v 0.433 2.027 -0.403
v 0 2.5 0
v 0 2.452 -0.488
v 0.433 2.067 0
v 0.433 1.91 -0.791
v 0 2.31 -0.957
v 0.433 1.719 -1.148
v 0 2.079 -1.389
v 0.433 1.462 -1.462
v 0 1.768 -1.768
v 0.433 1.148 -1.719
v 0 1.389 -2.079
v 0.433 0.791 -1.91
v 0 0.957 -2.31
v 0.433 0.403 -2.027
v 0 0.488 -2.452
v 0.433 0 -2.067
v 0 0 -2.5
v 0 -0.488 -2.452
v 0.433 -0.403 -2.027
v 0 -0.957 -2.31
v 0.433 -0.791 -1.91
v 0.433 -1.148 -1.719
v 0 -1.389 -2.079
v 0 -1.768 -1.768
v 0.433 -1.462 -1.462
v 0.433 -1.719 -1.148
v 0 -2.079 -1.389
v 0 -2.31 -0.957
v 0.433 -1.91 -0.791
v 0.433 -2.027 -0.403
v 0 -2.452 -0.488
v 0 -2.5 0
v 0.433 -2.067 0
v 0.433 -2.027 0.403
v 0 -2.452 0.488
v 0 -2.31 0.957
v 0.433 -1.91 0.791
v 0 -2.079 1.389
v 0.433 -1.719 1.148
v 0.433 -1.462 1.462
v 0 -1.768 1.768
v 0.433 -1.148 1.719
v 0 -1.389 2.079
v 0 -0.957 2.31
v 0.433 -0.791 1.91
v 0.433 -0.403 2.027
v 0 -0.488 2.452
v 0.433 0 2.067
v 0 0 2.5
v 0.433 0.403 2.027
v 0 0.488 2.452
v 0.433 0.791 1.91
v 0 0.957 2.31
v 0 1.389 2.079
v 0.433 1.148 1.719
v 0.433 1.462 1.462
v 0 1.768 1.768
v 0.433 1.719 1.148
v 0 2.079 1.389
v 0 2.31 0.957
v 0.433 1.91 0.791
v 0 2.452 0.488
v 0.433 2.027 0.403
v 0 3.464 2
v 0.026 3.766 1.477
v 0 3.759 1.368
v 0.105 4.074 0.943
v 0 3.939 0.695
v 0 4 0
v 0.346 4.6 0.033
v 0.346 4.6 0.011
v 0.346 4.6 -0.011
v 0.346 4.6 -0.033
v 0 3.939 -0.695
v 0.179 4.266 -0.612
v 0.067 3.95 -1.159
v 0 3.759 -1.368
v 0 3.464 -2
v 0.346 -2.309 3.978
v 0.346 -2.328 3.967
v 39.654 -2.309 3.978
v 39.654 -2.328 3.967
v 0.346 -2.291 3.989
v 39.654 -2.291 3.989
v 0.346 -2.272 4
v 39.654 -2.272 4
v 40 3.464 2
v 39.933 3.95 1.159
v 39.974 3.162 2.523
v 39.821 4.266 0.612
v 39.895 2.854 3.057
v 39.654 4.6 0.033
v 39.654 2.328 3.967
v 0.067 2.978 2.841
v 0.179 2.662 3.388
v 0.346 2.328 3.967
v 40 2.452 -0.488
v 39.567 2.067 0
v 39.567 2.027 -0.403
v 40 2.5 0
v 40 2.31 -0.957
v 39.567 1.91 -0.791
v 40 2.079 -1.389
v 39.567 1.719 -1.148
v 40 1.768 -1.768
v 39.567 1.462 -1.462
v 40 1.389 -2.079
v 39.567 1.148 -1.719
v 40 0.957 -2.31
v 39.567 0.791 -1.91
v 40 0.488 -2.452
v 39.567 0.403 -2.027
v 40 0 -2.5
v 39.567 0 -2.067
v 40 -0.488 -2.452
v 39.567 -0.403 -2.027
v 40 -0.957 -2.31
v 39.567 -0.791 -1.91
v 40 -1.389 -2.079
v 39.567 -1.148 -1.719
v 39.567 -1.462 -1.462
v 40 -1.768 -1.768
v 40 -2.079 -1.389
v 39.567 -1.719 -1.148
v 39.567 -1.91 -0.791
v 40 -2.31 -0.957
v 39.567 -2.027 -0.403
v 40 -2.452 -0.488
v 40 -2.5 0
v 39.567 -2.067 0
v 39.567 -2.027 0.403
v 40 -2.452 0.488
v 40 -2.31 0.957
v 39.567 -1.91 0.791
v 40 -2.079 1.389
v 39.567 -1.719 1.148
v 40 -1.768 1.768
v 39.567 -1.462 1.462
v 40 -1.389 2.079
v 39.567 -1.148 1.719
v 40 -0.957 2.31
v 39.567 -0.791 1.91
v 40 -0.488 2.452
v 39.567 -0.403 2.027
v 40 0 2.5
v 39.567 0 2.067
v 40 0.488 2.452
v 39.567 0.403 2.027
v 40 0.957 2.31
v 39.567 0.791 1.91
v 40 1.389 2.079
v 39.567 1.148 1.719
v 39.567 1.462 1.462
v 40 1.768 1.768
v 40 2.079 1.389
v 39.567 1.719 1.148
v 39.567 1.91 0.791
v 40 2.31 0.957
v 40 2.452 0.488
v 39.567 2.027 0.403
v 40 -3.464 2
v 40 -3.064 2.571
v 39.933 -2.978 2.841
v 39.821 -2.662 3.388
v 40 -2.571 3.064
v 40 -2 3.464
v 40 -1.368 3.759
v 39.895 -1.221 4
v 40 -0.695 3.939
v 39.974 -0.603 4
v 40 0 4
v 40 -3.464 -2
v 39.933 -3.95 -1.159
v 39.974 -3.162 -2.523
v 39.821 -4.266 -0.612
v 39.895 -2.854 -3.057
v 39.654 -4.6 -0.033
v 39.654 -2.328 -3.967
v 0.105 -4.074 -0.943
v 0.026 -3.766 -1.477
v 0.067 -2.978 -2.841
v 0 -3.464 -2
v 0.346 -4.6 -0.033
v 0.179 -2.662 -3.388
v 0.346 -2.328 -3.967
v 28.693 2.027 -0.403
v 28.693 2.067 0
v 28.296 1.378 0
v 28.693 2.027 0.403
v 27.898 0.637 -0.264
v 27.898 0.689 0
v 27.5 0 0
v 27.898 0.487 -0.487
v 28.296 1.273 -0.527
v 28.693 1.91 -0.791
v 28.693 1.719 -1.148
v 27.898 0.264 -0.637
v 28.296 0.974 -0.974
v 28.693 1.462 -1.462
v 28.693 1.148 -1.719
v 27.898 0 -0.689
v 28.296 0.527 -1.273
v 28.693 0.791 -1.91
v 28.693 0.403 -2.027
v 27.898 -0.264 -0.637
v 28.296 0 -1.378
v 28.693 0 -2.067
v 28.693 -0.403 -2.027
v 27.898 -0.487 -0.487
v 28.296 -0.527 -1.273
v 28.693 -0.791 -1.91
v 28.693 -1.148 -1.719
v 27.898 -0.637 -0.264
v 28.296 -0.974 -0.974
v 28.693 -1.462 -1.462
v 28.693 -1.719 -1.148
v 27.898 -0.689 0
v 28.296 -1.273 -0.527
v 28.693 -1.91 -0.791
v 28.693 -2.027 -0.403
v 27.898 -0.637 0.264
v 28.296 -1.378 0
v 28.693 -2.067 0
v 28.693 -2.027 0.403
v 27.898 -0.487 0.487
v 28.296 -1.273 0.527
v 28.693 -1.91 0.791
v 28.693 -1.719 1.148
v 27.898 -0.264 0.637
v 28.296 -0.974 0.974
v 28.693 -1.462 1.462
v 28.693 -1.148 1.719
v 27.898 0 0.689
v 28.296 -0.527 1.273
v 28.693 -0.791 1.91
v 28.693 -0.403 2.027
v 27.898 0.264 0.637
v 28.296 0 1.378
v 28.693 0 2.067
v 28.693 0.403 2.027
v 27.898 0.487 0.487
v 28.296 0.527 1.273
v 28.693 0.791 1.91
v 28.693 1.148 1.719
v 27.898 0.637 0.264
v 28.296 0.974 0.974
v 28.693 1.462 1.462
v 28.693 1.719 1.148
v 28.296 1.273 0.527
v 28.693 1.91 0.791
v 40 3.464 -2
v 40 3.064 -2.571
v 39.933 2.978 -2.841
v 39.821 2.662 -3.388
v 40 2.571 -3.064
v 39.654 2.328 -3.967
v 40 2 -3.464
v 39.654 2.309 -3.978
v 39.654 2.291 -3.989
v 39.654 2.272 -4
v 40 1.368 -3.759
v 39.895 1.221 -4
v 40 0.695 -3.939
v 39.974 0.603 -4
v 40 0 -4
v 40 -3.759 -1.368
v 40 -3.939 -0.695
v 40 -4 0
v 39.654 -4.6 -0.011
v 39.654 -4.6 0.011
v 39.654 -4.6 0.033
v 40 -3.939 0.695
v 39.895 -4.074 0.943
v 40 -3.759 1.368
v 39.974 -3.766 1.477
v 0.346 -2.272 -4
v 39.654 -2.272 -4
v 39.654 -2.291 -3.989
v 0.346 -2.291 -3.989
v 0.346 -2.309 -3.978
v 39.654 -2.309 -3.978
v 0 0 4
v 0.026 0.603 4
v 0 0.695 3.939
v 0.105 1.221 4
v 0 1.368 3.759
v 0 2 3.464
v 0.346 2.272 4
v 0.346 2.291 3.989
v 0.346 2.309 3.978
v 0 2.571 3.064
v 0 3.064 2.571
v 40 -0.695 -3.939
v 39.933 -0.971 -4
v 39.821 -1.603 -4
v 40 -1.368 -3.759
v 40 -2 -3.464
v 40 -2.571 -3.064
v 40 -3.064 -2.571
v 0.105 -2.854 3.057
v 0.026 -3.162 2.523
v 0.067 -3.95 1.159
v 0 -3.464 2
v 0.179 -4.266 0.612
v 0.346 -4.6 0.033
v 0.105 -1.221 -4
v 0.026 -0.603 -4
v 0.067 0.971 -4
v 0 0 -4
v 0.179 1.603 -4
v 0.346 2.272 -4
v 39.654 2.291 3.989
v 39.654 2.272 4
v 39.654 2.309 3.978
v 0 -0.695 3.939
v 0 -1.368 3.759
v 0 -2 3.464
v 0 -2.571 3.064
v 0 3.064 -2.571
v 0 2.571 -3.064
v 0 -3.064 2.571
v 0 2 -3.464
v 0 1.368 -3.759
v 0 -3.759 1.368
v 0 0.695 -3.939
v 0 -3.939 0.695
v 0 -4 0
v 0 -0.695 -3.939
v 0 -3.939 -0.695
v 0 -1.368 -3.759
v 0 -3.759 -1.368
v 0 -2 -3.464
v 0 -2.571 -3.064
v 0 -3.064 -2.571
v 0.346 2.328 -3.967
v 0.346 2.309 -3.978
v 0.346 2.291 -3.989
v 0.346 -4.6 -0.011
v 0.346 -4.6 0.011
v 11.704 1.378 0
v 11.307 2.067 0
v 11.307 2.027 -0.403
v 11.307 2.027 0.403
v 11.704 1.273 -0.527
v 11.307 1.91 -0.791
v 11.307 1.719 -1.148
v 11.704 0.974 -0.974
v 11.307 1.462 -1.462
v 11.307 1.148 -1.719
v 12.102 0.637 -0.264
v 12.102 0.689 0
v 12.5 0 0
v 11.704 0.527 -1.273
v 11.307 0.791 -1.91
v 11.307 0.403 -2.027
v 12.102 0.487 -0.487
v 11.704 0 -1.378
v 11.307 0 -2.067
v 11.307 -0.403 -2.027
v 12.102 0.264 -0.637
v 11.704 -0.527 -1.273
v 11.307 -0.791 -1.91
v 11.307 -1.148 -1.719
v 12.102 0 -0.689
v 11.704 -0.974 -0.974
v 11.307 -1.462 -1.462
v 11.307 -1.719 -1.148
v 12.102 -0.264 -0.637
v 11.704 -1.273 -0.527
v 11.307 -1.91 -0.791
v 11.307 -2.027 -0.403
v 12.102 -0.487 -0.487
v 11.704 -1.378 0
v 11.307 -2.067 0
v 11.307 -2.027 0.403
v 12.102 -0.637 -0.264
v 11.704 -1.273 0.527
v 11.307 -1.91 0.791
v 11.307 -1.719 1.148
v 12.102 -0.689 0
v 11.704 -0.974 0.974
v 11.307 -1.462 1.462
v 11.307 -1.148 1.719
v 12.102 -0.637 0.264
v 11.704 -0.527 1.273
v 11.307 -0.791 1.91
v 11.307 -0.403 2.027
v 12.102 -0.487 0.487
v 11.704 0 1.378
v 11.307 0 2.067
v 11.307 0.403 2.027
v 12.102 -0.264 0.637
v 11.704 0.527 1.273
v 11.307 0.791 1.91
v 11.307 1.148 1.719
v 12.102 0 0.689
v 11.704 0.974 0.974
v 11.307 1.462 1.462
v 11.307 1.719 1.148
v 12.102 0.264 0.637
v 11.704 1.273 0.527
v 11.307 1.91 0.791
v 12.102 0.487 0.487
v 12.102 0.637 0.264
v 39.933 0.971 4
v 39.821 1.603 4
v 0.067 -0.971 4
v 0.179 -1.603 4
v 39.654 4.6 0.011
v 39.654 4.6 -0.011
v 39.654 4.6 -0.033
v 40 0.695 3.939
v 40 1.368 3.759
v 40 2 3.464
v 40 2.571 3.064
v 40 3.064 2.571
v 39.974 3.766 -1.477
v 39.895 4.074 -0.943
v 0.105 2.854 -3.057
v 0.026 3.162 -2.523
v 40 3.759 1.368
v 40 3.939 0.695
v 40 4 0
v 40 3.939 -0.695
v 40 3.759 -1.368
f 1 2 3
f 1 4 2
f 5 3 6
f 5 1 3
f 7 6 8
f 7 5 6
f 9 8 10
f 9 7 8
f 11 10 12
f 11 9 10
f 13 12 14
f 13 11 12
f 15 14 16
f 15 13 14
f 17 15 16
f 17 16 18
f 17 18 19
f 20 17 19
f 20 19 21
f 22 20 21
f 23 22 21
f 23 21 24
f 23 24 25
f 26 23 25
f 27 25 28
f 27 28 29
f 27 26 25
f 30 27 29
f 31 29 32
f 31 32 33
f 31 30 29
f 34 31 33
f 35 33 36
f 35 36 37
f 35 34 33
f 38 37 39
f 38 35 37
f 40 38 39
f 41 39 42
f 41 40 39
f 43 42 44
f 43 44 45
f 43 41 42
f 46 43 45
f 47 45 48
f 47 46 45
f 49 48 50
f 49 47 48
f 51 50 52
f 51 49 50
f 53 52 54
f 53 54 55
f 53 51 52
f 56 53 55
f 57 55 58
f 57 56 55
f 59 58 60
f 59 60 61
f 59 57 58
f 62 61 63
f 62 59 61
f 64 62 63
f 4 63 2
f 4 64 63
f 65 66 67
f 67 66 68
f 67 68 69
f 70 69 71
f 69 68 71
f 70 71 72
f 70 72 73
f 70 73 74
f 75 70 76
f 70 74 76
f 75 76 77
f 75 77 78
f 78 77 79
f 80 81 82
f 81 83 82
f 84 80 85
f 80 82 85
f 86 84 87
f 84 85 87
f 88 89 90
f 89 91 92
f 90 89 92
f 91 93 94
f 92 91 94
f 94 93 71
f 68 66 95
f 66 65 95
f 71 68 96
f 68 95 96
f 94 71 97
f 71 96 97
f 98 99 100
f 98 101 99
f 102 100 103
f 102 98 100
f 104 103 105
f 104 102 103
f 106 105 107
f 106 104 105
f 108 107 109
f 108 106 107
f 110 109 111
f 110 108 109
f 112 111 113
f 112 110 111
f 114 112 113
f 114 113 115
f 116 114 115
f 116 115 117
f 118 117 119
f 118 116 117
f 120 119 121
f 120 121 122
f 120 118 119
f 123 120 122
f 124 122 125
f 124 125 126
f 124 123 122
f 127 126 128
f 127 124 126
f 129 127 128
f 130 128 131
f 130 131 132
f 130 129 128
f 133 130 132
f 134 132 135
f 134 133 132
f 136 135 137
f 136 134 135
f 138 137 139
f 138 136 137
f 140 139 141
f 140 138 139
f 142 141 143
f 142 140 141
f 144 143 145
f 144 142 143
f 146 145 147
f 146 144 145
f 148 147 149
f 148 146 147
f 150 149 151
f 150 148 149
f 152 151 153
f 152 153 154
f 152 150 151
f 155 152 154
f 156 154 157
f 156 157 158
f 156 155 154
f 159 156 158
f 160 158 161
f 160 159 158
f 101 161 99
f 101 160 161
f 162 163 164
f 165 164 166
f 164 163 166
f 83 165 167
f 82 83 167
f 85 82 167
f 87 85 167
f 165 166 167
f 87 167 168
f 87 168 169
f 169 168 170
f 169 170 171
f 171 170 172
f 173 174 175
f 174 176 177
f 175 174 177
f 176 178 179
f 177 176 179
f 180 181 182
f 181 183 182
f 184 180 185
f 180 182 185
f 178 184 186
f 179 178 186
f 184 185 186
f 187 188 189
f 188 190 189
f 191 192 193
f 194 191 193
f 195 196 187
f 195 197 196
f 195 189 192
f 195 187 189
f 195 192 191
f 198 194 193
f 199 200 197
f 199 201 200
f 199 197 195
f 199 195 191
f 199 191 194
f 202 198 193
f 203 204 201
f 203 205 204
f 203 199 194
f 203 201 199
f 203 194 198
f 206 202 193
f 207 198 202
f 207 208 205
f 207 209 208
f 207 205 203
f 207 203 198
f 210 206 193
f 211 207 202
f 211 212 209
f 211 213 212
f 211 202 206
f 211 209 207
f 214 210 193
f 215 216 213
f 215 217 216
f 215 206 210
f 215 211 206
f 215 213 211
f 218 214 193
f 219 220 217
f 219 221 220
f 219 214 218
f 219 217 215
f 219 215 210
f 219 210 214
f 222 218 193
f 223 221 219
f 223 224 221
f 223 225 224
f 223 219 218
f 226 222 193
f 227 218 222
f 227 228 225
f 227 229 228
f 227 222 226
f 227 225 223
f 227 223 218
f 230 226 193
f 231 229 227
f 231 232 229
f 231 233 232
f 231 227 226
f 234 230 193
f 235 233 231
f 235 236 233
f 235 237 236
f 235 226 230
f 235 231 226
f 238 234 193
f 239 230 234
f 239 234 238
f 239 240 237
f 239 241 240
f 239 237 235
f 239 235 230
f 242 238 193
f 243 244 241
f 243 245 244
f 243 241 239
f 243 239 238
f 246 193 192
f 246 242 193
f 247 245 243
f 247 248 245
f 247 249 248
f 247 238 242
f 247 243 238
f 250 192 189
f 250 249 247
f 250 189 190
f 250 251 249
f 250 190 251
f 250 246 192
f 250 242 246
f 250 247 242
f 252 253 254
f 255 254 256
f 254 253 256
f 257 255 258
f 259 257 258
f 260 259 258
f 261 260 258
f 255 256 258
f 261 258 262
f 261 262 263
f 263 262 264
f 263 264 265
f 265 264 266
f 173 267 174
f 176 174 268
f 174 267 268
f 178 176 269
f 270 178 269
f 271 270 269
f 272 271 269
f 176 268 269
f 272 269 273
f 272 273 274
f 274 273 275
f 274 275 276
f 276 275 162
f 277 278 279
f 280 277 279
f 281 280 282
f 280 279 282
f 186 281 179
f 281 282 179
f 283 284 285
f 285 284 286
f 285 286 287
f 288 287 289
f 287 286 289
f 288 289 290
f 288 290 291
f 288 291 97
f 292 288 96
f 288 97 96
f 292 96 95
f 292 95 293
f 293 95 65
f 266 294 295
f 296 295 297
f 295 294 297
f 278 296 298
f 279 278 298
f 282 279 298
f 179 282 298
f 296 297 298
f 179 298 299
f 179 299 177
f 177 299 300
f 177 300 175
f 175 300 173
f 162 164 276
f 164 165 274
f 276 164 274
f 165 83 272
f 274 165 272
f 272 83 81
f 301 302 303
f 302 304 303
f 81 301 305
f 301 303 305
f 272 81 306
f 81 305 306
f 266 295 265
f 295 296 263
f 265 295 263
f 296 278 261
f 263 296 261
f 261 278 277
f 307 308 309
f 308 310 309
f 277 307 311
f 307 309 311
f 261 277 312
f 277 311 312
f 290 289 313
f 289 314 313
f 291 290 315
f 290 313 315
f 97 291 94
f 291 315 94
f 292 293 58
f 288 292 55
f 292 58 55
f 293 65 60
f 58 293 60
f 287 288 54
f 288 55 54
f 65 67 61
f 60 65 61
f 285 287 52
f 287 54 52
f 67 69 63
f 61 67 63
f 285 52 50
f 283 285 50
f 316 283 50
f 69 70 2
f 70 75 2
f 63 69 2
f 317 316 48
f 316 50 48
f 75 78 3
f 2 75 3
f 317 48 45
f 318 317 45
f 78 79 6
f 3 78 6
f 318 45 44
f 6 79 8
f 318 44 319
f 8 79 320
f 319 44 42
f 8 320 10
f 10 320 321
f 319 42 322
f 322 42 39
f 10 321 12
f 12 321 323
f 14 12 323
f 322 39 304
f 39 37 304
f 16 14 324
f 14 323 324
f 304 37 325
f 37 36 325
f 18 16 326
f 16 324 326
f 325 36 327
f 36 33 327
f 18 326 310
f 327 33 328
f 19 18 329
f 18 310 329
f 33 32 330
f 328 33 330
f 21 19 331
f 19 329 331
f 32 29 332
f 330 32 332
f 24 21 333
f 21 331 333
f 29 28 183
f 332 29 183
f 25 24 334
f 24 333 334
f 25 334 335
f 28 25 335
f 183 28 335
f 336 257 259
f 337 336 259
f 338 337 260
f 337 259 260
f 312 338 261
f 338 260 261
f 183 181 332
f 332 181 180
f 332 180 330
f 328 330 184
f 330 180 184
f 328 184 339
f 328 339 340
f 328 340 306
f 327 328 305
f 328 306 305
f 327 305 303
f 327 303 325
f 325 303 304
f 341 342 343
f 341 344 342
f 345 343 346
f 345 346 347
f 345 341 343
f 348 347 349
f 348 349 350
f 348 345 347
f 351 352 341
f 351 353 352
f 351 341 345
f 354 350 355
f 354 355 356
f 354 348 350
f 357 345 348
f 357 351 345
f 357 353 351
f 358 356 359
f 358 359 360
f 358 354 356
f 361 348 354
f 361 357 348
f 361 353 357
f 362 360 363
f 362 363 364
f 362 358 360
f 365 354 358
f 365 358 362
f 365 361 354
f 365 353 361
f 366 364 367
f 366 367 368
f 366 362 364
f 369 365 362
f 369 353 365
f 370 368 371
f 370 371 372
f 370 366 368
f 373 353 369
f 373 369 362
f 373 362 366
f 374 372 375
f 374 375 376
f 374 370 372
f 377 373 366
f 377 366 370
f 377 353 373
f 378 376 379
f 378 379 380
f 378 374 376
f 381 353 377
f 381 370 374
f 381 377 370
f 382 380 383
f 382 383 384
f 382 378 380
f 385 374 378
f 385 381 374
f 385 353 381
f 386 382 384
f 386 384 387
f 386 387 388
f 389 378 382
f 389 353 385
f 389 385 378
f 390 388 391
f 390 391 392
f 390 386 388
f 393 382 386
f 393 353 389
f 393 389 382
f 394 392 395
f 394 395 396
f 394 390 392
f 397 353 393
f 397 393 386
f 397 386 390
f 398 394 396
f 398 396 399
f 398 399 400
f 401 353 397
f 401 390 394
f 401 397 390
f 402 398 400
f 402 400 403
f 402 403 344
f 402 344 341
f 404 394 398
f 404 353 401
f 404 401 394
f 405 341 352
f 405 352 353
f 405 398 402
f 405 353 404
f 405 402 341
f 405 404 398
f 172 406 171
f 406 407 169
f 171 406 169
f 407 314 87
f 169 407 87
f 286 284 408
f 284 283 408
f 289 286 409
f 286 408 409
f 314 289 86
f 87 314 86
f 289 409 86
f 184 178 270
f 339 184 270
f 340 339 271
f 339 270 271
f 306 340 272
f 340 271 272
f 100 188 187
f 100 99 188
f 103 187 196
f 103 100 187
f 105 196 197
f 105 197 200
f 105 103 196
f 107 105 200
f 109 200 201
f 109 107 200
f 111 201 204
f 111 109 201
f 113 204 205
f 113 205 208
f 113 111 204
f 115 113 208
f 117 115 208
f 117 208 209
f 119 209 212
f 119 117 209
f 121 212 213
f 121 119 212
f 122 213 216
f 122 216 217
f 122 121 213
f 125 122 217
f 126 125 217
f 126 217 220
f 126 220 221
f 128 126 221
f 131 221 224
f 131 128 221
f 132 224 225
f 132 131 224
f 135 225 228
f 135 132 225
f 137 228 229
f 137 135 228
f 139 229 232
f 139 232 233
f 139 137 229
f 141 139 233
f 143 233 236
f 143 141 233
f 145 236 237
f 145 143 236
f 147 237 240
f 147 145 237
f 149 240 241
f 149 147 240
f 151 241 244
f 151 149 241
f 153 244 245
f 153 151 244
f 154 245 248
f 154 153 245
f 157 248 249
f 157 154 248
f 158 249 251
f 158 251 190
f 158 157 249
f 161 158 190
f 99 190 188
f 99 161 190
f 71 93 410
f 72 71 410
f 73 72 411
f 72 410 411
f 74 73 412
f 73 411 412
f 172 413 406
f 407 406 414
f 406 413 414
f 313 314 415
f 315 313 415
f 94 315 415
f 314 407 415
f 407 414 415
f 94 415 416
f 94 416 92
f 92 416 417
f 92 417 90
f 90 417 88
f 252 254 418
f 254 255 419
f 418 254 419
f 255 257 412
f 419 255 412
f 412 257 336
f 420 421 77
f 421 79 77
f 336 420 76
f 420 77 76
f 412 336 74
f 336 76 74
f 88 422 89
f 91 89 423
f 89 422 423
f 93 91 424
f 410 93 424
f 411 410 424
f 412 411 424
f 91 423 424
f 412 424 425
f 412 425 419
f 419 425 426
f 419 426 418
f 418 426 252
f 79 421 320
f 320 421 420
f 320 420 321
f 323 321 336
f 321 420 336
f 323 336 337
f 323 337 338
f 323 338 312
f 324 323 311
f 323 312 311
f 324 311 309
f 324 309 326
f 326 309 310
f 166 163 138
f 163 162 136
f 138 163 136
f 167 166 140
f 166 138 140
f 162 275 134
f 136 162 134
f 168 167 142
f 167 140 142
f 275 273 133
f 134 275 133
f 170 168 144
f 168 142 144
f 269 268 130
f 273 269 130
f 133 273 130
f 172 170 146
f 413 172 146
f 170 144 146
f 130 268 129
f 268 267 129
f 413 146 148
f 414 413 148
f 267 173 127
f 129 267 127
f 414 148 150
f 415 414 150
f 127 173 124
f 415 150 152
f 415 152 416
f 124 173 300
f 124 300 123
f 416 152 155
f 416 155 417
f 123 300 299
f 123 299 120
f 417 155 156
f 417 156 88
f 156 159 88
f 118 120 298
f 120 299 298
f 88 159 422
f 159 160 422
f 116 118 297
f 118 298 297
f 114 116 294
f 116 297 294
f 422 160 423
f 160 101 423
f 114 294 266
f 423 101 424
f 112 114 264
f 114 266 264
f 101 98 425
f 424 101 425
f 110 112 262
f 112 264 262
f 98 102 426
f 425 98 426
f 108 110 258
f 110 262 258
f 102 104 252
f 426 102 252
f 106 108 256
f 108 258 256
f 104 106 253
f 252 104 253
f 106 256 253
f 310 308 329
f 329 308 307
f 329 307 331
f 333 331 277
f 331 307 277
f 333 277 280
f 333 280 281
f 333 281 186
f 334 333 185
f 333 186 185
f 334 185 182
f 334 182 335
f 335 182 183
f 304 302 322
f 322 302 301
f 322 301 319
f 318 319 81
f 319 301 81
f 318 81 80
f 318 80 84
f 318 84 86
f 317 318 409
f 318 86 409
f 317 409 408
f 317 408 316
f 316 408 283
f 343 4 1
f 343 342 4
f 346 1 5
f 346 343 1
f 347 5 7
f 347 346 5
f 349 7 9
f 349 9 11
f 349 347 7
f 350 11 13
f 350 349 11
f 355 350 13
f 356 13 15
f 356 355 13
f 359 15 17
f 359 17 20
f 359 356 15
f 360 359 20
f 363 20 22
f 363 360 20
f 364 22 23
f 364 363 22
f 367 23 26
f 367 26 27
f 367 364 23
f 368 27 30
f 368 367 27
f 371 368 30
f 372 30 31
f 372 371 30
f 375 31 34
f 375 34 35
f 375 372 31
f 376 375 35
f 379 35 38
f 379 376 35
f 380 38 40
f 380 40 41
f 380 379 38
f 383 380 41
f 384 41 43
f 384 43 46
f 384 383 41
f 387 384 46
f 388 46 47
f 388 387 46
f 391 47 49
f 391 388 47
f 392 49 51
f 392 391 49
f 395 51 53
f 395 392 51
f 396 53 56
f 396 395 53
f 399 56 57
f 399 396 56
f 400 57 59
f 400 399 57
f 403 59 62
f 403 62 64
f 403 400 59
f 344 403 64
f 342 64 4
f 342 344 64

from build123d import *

# Parameters (mm, degrees)
SKETCH2_W          = 16
SKETCH2_H          = 16
CUT_EXTRUDE1_DEPTH = 40


with BuildPart() as part:
    # Sketch1 → Revolve1 (revolve)
    with BuildSketch(Plane.XY):
        Polygon((0, 0), (0, 4), (0.346410162, 4.6), (39.653589838, 4.6), (40, 4), (40, 0), align=None)
    revolve(axis=Axis((40, 0, 0), (-1, 0, 0)))

    # Sketch2 → Cut-Extrude1 (cut)
    with BuildSketch(Plane(origin=(0, 0, 0), x_dir=(0, 0, -1), z_dir=(1, 0, 0))):
        Rectangle(SKETCH2_W, SKETCH2_H)
        Polygon((-4, 2.309401077), (-4, -2.309401077), (0, -4.618802154), (4, -2.309401077), (4, 2.309401077), (0, 4.618802154), align=None, mode=Mode.SUBTRACT)
    extrude(amount=CUT_EXTRUDE1_DEPTH, mode=Mode.SUBTRACT)

    # Sketch3 → Cut-Revolve1 (revolve, cut)
    with BuildSketch(Plane.XY):
        Polygon((0, 0), (0, 2.5), (0.433, 2.067), (11.306616994, 2.067), (12.5, 0), align=None)
    revolve(axis=Axis((12.5, 0, 0), (-1, 0, 0)), mode=Mode.SUBTRACT)

    # Sketch4 → Cut-Revolve2 (revolve, cut)
    with BuildSketch(Plane.XY):
        Polygon((27.5, 0), (28.693383006, 2.067), (39.567, 2.067), (40, 2.5), (40, 0), align=None)
    revolve(axis=Axis((40, 0, 0), (-1, 0, 0)), mode=Mode.SUBTRACT)


solid = part.part
